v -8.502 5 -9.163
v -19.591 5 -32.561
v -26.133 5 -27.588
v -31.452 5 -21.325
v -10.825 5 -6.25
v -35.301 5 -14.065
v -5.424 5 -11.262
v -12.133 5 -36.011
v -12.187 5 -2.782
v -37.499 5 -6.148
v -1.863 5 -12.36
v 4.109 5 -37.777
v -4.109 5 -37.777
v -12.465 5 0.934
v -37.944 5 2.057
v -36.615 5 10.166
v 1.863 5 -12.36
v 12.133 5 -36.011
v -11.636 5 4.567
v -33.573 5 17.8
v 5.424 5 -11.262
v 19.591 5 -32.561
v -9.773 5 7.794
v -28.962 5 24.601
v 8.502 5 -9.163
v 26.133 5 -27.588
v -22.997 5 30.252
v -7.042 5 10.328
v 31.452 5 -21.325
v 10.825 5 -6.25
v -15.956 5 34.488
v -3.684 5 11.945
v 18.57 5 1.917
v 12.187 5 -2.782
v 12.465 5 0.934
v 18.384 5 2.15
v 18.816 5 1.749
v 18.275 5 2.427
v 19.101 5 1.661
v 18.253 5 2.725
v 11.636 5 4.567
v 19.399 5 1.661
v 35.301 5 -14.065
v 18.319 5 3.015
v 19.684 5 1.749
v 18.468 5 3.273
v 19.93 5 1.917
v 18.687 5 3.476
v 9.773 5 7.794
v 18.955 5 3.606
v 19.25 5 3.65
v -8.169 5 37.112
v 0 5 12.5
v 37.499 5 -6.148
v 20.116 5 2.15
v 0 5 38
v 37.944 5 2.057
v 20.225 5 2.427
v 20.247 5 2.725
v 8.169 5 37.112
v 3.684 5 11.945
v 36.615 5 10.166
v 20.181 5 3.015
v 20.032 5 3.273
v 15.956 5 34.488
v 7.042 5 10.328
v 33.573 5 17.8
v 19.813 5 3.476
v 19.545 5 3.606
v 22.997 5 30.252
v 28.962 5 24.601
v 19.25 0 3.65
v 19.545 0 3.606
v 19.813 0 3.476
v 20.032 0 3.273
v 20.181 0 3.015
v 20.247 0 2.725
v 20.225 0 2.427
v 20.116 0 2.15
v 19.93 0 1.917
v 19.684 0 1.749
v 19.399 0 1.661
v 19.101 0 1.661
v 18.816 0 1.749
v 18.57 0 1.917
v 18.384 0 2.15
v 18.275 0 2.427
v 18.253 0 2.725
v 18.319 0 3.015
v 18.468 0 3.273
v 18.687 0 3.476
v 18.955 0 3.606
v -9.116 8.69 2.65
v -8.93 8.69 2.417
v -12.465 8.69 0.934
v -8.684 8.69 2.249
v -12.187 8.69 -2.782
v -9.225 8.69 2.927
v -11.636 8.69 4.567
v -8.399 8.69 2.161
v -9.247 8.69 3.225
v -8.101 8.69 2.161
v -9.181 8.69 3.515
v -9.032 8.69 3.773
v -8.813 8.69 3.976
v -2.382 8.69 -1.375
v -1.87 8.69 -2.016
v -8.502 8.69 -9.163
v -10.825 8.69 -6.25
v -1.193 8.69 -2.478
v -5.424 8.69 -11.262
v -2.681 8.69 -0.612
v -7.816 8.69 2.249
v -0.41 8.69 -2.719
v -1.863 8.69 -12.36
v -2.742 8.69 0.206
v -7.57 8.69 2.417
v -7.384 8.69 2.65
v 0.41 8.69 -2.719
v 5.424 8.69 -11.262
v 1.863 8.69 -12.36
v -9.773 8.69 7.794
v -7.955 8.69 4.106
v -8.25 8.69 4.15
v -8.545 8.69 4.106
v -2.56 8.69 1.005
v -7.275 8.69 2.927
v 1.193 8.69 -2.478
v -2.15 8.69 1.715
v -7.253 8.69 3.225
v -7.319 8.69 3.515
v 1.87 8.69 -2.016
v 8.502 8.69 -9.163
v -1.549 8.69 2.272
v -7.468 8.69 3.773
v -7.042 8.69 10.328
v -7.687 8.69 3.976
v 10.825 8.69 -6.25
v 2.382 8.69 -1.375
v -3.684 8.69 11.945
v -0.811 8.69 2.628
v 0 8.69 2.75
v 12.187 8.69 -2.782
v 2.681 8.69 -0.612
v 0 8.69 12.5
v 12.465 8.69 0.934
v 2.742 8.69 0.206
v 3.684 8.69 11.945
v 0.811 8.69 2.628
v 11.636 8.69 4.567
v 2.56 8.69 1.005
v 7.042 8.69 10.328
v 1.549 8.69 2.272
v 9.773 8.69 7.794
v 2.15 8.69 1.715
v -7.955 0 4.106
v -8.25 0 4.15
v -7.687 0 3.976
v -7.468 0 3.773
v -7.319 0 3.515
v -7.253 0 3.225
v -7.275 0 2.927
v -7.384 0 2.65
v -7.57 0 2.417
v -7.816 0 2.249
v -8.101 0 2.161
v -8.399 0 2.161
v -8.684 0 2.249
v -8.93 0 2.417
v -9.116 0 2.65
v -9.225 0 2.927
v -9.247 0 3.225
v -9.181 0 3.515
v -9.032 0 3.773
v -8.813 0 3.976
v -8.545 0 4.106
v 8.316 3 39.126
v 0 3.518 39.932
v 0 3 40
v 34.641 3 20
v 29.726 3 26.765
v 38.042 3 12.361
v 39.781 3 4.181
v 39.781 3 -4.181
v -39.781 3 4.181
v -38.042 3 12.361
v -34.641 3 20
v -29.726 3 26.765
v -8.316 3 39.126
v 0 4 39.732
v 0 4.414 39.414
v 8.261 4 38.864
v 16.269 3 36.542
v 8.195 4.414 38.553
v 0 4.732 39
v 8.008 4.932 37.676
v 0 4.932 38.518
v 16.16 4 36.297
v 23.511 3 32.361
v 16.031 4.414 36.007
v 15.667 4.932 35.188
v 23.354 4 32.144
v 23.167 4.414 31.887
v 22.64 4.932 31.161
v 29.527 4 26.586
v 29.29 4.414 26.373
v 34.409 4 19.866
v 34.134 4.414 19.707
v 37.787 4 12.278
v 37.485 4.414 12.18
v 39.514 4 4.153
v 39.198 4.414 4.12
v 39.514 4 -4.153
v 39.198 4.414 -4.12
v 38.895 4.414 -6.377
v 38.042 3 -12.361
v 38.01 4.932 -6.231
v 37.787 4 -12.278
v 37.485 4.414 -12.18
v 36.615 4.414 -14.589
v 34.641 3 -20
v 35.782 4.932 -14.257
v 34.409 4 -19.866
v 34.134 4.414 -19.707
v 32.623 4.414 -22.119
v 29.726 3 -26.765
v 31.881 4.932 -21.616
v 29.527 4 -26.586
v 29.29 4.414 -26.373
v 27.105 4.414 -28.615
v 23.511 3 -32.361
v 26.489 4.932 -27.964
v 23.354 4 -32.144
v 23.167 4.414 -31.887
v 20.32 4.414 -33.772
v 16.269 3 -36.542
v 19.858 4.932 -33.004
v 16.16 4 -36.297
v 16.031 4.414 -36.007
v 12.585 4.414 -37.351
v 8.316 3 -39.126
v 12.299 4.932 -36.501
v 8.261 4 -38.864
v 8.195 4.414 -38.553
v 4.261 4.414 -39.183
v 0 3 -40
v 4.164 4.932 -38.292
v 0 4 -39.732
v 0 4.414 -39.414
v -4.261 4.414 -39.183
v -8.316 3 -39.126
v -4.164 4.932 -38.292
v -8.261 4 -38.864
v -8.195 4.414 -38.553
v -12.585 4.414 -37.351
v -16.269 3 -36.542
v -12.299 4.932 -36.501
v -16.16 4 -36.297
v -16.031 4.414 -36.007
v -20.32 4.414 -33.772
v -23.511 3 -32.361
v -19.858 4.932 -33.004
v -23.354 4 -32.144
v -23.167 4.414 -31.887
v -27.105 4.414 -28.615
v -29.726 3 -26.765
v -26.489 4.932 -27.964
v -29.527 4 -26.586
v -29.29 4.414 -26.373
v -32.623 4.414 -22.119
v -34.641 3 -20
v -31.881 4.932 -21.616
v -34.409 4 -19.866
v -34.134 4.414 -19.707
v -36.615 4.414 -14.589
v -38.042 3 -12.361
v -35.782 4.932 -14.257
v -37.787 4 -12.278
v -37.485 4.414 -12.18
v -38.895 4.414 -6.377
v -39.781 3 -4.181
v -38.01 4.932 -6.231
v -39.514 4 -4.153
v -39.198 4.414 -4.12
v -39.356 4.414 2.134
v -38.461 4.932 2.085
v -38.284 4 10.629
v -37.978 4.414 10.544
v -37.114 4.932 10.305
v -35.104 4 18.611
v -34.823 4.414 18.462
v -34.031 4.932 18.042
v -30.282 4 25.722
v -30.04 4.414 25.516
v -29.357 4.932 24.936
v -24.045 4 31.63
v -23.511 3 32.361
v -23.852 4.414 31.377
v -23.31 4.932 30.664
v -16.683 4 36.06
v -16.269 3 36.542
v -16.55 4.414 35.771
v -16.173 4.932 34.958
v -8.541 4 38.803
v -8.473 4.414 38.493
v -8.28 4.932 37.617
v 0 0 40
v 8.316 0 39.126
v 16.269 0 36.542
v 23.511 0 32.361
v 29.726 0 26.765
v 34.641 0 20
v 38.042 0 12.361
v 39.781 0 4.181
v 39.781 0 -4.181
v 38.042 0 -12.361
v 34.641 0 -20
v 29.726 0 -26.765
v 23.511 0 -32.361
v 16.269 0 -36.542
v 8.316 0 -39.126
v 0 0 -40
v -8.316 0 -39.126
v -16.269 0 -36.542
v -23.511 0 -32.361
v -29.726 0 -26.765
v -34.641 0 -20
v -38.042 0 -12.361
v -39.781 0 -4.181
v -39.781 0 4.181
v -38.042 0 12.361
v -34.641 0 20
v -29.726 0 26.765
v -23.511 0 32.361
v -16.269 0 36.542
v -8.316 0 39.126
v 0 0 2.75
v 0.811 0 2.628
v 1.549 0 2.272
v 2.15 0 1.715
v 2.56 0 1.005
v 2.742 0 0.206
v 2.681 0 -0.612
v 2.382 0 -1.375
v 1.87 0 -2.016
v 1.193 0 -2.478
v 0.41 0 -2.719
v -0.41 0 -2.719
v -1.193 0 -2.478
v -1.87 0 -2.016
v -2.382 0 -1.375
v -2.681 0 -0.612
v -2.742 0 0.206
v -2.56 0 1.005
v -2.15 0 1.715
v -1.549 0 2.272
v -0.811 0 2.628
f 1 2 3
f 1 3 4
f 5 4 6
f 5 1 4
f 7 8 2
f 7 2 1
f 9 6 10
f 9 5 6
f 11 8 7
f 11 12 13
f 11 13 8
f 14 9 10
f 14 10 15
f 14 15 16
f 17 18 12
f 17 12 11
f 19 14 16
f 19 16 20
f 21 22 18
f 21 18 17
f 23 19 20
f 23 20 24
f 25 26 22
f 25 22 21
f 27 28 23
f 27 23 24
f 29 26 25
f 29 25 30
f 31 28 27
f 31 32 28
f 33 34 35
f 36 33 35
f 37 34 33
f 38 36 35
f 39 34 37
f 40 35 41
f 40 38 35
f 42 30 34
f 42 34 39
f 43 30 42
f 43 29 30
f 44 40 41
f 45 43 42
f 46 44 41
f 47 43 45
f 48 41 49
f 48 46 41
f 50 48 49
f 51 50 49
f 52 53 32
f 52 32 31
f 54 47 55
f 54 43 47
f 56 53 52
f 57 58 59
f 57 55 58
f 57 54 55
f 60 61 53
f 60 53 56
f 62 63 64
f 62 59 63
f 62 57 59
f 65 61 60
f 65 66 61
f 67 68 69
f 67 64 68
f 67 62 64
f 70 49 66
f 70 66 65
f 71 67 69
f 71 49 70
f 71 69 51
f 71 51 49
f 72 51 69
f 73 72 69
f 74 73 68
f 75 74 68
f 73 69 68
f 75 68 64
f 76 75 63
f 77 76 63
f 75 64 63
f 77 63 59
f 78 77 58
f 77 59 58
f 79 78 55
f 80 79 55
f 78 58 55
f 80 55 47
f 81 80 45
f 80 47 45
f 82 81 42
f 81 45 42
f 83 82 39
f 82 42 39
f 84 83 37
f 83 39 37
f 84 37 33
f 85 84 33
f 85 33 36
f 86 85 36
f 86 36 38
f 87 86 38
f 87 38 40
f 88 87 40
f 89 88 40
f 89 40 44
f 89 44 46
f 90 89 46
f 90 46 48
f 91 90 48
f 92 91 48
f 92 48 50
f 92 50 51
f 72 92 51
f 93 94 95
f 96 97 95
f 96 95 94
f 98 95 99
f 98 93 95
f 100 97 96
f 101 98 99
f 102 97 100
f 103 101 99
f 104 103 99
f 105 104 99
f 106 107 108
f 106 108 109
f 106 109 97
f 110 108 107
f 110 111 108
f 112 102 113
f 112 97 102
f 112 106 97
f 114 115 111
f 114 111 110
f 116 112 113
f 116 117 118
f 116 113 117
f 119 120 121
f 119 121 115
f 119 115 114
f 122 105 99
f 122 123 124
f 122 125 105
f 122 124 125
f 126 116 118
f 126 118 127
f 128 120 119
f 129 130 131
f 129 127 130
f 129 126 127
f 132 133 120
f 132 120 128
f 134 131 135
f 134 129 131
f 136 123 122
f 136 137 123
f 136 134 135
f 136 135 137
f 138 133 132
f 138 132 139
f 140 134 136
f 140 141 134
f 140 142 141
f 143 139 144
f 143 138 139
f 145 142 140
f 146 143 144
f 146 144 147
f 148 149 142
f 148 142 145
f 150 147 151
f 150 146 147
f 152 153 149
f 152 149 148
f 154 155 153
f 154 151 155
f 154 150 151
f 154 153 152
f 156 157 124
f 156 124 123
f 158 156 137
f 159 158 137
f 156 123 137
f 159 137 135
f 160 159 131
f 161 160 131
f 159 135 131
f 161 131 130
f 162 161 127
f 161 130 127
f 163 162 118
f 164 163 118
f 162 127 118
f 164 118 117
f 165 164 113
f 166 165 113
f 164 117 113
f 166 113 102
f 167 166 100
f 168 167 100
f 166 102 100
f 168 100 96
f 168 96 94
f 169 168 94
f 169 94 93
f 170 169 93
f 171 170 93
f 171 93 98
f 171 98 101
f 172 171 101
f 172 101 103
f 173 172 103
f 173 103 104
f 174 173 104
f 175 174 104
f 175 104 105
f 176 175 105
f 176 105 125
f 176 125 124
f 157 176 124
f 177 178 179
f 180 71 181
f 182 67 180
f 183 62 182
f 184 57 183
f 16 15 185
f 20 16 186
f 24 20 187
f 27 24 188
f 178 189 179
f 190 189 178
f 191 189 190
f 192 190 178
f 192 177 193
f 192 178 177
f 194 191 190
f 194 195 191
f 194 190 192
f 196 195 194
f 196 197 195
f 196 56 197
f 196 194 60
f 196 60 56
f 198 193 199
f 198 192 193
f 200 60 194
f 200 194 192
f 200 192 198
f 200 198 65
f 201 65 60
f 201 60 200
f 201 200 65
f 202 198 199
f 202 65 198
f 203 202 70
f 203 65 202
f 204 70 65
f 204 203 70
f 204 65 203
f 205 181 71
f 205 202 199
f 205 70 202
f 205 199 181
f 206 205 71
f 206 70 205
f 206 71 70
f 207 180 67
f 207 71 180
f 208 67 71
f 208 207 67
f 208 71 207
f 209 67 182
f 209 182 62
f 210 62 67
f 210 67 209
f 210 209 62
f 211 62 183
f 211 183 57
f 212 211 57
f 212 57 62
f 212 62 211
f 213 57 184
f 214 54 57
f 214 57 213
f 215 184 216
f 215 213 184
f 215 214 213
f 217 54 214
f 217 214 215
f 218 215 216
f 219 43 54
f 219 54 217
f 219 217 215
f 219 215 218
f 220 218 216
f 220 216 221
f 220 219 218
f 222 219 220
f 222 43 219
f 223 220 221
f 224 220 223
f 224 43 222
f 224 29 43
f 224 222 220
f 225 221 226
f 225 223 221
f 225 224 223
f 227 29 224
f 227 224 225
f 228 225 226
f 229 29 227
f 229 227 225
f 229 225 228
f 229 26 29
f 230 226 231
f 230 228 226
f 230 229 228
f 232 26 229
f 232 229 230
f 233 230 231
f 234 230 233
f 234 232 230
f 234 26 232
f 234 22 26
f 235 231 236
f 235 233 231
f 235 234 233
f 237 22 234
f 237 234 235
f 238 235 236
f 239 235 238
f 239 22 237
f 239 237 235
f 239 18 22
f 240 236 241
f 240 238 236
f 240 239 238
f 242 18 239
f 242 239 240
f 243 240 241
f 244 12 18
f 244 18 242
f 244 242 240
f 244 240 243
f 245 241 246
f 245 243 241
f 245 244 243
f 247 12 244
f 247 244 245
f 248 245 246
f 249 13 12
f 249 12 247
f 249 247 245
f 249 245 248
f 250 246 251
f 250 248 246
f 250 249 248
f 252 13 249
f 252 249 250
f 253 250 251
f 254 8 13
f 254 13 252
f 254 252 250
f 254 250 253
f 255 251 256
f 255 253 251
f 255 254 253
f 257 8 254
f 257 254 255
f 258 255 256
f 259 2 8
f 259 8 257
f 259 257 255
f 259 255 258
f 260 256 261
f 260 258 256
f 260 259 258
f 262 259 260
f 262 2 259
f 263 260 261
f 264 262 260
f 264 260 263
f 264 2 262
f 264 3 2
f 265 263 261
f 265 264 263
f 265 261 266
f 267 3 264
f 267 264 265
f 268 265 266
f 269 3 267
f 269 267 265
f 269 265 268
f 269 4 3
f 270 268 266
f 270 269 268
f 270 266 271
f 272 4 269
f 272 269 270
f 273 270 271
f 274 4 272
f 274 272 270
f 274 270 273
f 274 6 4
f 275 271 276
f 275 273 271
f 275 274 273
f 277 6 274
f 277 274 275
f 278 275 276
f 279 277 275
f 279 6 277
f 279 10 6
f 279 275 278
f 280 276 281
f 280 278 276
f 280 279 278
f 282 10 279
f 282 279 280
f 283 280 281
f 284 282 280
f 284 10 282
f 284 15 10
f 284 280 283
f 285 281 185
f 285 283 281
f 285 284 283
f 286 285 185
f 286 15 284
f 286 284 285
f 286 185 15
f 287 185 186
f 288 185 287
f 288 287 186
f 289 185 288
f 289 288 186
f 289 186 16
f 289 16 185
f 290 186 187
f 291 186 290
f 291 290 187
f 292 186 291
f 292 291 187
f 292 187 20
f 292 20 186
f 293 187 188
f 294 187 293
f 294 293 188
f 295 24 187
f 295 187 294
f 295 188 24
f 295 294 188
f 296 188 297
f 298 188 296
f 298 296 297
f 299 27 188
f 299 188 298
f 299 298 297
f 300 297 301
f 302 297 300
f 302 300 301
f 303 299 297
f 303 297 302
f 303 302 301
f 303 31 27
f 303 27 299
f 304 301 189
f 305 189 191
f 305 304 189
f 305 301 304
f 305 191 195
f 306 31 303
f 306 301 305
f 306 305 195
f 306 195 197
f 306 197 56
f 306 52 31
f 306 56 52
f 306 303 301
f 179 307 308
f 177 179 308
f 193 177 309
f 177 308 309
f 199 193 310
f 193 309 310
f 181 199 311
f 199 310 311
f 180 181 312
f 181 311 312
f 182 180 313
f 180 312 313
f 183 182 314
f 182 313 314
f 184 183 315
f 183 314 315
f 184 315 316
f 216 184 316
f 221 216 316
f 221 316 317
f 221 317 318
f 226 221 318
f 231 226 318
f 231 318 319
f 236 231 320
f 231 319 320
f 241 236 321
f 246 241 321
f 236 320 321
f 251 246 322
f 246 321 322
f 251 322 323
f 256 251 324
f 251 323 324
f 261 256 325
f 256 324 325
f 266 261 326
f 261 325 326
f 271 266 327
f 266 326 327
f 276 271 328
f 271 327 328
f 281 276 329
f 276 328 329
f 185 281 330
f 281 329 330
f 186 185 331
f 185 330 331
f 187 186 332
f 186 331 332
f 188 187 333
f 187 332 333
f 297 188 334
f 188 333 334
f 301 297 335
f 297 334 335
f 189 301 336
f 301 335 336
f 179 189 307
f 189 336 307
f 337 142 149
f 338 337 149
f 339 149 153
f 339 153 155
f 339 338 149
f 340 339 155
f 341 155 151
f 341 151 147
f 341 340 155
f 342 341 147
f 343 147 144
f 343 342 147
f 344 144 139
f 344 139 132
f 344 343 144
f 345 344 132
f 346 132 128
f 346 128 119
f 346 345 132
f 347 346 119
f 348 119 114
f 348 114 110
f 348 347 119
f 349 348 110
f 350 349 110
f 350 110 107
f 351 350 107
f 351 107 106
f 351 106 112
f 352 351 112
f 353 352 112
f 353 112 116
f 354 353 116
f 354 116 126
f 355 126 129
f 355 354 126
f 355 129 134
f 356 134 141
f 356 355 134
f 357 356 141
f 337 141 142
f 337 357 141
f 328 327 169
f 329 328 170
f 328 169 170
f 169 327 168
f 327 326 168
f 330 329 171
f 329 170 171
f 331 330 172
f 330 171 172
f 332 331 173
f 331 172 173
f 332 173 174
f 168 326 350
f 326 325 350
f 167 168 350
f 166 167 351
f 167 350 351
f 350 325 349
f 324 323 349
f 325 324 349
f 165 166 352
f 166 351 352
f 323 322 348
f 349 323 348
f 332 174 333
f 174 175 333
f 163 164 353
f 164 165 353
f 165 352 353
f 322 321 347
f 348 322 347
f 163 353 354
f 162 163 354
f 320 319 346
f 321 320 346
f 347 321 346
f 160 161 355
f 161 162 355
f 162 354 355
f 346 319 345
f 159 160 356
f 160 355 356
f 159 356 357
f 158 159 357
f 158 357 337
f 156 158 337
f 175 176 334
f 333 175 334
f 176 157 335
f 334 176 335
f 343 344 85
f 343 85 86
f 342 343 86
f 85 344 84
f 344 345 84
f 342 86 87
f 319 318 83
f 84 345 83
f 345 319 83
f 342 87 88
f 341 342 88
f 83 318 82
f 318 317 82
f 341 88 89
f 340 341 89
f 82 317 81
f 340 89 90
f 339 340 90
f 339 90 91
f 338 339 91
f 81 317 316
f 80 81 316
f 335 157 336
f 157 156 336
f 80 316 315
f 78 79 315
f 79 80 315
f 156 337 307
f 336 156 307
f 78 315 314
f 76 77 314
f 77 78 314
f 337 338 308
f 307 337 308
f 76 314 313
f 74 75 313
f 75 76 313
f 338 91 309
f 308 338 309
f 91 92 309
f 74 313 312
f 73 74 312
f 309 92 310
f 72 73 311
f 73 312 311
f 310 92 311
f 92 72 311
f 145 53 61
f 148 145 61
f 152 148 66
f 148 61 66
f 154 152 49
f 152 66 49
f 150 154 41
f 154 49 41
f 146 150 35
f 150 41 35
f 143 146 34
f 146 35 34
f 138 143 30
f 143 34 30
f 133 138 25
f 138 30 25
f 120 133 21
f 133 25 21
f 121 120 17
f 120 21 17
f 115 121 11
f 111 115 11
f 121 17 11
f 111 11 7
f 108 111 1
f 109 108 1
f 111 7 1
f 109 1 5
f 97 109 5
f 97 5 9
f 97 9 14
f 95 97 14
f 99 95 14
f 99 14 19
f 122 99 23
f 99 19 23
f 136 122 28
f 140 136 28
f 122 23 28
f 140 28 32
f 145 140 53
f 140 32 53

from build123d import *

# Parameters (mm, degrees)
SKETCH2_R           = 40
SKETCH2_R_2         = 2.75
BOSS_EXTRUDE1_DEPTH = 5
FILLET1_R           = 2
SKETCH3_R           = 12.5
SKETCH3_R_2         = 2.75
BOSS_EXTRUDE2_DEPTH = 3.69
SKETCH4_R           = 1
CUT_EXTRUDE1_DEPTH  = 58.23212479


with BuildPart() as part:
    # Sketch2 → Boss-Extrude1 (new body)
    with BuildSketch(Plane(origin=(0, 0, 0), x_dir=(1, 0, 0), z_dir=(0, 1, 0))):
        with Locations(Location((0, 0, 0), (0, 0, 270))):
            Circle(SKETCH2_R)
        with Locations(Location((0, 0, 0), (0, 0, 270))):
            Circle(SKETCH2_R_2, mode=Mode.SUBTRACT)
    extrude(amount=BOSS_EXTRUDE1_DEPTH)

    # Fillet1
    fillet1_edges = [part.edges().sort_by_distance(p)[0] for p in [
        (0, 5, -40),
    ]]
    fillet(fillet1_edges, radius=FILLET1_R)

    # Sketch3 → Boss-Extrude2 (add)
    with BuildSketch(Plane(origin=(0, 5, 0), x_dir=(1, 0, 0), z_dir=(0, 1, 0))):
        with Locations(Location((0, 0, 0), (0, 0, 270))):
            Circle(SKETCH3_R)
        with Locations(Location((0, 0, 0), (0, 0, 270))):
            Circle(SKETCH3_R_2, mode=Mode.SUBTRACT)
    extrude(amount=BOSS_EXTRUDE2_DEPTH)

    # Sketch4 → Cut-Extrude1 (cut, through all)
    with BuildSketch(Plane(origin=(0, 8.69, 0), x_dir=(1, 0, 0), z_dir=(0, 1, 0))):
        with Locations(Location((-8.25, -3.15, 0), (0, 0, 270))):
            Circle(SKETCH4_R)
        with Locations(Location((19.25, -2.65, 0), (0, 0, 270))):
            Circle(SKETCH4_R)
    extrude(amount=-CUT_EXTRUDE1_DEPTH, mode=Mode.SUBTRACT)


solid = part.part
